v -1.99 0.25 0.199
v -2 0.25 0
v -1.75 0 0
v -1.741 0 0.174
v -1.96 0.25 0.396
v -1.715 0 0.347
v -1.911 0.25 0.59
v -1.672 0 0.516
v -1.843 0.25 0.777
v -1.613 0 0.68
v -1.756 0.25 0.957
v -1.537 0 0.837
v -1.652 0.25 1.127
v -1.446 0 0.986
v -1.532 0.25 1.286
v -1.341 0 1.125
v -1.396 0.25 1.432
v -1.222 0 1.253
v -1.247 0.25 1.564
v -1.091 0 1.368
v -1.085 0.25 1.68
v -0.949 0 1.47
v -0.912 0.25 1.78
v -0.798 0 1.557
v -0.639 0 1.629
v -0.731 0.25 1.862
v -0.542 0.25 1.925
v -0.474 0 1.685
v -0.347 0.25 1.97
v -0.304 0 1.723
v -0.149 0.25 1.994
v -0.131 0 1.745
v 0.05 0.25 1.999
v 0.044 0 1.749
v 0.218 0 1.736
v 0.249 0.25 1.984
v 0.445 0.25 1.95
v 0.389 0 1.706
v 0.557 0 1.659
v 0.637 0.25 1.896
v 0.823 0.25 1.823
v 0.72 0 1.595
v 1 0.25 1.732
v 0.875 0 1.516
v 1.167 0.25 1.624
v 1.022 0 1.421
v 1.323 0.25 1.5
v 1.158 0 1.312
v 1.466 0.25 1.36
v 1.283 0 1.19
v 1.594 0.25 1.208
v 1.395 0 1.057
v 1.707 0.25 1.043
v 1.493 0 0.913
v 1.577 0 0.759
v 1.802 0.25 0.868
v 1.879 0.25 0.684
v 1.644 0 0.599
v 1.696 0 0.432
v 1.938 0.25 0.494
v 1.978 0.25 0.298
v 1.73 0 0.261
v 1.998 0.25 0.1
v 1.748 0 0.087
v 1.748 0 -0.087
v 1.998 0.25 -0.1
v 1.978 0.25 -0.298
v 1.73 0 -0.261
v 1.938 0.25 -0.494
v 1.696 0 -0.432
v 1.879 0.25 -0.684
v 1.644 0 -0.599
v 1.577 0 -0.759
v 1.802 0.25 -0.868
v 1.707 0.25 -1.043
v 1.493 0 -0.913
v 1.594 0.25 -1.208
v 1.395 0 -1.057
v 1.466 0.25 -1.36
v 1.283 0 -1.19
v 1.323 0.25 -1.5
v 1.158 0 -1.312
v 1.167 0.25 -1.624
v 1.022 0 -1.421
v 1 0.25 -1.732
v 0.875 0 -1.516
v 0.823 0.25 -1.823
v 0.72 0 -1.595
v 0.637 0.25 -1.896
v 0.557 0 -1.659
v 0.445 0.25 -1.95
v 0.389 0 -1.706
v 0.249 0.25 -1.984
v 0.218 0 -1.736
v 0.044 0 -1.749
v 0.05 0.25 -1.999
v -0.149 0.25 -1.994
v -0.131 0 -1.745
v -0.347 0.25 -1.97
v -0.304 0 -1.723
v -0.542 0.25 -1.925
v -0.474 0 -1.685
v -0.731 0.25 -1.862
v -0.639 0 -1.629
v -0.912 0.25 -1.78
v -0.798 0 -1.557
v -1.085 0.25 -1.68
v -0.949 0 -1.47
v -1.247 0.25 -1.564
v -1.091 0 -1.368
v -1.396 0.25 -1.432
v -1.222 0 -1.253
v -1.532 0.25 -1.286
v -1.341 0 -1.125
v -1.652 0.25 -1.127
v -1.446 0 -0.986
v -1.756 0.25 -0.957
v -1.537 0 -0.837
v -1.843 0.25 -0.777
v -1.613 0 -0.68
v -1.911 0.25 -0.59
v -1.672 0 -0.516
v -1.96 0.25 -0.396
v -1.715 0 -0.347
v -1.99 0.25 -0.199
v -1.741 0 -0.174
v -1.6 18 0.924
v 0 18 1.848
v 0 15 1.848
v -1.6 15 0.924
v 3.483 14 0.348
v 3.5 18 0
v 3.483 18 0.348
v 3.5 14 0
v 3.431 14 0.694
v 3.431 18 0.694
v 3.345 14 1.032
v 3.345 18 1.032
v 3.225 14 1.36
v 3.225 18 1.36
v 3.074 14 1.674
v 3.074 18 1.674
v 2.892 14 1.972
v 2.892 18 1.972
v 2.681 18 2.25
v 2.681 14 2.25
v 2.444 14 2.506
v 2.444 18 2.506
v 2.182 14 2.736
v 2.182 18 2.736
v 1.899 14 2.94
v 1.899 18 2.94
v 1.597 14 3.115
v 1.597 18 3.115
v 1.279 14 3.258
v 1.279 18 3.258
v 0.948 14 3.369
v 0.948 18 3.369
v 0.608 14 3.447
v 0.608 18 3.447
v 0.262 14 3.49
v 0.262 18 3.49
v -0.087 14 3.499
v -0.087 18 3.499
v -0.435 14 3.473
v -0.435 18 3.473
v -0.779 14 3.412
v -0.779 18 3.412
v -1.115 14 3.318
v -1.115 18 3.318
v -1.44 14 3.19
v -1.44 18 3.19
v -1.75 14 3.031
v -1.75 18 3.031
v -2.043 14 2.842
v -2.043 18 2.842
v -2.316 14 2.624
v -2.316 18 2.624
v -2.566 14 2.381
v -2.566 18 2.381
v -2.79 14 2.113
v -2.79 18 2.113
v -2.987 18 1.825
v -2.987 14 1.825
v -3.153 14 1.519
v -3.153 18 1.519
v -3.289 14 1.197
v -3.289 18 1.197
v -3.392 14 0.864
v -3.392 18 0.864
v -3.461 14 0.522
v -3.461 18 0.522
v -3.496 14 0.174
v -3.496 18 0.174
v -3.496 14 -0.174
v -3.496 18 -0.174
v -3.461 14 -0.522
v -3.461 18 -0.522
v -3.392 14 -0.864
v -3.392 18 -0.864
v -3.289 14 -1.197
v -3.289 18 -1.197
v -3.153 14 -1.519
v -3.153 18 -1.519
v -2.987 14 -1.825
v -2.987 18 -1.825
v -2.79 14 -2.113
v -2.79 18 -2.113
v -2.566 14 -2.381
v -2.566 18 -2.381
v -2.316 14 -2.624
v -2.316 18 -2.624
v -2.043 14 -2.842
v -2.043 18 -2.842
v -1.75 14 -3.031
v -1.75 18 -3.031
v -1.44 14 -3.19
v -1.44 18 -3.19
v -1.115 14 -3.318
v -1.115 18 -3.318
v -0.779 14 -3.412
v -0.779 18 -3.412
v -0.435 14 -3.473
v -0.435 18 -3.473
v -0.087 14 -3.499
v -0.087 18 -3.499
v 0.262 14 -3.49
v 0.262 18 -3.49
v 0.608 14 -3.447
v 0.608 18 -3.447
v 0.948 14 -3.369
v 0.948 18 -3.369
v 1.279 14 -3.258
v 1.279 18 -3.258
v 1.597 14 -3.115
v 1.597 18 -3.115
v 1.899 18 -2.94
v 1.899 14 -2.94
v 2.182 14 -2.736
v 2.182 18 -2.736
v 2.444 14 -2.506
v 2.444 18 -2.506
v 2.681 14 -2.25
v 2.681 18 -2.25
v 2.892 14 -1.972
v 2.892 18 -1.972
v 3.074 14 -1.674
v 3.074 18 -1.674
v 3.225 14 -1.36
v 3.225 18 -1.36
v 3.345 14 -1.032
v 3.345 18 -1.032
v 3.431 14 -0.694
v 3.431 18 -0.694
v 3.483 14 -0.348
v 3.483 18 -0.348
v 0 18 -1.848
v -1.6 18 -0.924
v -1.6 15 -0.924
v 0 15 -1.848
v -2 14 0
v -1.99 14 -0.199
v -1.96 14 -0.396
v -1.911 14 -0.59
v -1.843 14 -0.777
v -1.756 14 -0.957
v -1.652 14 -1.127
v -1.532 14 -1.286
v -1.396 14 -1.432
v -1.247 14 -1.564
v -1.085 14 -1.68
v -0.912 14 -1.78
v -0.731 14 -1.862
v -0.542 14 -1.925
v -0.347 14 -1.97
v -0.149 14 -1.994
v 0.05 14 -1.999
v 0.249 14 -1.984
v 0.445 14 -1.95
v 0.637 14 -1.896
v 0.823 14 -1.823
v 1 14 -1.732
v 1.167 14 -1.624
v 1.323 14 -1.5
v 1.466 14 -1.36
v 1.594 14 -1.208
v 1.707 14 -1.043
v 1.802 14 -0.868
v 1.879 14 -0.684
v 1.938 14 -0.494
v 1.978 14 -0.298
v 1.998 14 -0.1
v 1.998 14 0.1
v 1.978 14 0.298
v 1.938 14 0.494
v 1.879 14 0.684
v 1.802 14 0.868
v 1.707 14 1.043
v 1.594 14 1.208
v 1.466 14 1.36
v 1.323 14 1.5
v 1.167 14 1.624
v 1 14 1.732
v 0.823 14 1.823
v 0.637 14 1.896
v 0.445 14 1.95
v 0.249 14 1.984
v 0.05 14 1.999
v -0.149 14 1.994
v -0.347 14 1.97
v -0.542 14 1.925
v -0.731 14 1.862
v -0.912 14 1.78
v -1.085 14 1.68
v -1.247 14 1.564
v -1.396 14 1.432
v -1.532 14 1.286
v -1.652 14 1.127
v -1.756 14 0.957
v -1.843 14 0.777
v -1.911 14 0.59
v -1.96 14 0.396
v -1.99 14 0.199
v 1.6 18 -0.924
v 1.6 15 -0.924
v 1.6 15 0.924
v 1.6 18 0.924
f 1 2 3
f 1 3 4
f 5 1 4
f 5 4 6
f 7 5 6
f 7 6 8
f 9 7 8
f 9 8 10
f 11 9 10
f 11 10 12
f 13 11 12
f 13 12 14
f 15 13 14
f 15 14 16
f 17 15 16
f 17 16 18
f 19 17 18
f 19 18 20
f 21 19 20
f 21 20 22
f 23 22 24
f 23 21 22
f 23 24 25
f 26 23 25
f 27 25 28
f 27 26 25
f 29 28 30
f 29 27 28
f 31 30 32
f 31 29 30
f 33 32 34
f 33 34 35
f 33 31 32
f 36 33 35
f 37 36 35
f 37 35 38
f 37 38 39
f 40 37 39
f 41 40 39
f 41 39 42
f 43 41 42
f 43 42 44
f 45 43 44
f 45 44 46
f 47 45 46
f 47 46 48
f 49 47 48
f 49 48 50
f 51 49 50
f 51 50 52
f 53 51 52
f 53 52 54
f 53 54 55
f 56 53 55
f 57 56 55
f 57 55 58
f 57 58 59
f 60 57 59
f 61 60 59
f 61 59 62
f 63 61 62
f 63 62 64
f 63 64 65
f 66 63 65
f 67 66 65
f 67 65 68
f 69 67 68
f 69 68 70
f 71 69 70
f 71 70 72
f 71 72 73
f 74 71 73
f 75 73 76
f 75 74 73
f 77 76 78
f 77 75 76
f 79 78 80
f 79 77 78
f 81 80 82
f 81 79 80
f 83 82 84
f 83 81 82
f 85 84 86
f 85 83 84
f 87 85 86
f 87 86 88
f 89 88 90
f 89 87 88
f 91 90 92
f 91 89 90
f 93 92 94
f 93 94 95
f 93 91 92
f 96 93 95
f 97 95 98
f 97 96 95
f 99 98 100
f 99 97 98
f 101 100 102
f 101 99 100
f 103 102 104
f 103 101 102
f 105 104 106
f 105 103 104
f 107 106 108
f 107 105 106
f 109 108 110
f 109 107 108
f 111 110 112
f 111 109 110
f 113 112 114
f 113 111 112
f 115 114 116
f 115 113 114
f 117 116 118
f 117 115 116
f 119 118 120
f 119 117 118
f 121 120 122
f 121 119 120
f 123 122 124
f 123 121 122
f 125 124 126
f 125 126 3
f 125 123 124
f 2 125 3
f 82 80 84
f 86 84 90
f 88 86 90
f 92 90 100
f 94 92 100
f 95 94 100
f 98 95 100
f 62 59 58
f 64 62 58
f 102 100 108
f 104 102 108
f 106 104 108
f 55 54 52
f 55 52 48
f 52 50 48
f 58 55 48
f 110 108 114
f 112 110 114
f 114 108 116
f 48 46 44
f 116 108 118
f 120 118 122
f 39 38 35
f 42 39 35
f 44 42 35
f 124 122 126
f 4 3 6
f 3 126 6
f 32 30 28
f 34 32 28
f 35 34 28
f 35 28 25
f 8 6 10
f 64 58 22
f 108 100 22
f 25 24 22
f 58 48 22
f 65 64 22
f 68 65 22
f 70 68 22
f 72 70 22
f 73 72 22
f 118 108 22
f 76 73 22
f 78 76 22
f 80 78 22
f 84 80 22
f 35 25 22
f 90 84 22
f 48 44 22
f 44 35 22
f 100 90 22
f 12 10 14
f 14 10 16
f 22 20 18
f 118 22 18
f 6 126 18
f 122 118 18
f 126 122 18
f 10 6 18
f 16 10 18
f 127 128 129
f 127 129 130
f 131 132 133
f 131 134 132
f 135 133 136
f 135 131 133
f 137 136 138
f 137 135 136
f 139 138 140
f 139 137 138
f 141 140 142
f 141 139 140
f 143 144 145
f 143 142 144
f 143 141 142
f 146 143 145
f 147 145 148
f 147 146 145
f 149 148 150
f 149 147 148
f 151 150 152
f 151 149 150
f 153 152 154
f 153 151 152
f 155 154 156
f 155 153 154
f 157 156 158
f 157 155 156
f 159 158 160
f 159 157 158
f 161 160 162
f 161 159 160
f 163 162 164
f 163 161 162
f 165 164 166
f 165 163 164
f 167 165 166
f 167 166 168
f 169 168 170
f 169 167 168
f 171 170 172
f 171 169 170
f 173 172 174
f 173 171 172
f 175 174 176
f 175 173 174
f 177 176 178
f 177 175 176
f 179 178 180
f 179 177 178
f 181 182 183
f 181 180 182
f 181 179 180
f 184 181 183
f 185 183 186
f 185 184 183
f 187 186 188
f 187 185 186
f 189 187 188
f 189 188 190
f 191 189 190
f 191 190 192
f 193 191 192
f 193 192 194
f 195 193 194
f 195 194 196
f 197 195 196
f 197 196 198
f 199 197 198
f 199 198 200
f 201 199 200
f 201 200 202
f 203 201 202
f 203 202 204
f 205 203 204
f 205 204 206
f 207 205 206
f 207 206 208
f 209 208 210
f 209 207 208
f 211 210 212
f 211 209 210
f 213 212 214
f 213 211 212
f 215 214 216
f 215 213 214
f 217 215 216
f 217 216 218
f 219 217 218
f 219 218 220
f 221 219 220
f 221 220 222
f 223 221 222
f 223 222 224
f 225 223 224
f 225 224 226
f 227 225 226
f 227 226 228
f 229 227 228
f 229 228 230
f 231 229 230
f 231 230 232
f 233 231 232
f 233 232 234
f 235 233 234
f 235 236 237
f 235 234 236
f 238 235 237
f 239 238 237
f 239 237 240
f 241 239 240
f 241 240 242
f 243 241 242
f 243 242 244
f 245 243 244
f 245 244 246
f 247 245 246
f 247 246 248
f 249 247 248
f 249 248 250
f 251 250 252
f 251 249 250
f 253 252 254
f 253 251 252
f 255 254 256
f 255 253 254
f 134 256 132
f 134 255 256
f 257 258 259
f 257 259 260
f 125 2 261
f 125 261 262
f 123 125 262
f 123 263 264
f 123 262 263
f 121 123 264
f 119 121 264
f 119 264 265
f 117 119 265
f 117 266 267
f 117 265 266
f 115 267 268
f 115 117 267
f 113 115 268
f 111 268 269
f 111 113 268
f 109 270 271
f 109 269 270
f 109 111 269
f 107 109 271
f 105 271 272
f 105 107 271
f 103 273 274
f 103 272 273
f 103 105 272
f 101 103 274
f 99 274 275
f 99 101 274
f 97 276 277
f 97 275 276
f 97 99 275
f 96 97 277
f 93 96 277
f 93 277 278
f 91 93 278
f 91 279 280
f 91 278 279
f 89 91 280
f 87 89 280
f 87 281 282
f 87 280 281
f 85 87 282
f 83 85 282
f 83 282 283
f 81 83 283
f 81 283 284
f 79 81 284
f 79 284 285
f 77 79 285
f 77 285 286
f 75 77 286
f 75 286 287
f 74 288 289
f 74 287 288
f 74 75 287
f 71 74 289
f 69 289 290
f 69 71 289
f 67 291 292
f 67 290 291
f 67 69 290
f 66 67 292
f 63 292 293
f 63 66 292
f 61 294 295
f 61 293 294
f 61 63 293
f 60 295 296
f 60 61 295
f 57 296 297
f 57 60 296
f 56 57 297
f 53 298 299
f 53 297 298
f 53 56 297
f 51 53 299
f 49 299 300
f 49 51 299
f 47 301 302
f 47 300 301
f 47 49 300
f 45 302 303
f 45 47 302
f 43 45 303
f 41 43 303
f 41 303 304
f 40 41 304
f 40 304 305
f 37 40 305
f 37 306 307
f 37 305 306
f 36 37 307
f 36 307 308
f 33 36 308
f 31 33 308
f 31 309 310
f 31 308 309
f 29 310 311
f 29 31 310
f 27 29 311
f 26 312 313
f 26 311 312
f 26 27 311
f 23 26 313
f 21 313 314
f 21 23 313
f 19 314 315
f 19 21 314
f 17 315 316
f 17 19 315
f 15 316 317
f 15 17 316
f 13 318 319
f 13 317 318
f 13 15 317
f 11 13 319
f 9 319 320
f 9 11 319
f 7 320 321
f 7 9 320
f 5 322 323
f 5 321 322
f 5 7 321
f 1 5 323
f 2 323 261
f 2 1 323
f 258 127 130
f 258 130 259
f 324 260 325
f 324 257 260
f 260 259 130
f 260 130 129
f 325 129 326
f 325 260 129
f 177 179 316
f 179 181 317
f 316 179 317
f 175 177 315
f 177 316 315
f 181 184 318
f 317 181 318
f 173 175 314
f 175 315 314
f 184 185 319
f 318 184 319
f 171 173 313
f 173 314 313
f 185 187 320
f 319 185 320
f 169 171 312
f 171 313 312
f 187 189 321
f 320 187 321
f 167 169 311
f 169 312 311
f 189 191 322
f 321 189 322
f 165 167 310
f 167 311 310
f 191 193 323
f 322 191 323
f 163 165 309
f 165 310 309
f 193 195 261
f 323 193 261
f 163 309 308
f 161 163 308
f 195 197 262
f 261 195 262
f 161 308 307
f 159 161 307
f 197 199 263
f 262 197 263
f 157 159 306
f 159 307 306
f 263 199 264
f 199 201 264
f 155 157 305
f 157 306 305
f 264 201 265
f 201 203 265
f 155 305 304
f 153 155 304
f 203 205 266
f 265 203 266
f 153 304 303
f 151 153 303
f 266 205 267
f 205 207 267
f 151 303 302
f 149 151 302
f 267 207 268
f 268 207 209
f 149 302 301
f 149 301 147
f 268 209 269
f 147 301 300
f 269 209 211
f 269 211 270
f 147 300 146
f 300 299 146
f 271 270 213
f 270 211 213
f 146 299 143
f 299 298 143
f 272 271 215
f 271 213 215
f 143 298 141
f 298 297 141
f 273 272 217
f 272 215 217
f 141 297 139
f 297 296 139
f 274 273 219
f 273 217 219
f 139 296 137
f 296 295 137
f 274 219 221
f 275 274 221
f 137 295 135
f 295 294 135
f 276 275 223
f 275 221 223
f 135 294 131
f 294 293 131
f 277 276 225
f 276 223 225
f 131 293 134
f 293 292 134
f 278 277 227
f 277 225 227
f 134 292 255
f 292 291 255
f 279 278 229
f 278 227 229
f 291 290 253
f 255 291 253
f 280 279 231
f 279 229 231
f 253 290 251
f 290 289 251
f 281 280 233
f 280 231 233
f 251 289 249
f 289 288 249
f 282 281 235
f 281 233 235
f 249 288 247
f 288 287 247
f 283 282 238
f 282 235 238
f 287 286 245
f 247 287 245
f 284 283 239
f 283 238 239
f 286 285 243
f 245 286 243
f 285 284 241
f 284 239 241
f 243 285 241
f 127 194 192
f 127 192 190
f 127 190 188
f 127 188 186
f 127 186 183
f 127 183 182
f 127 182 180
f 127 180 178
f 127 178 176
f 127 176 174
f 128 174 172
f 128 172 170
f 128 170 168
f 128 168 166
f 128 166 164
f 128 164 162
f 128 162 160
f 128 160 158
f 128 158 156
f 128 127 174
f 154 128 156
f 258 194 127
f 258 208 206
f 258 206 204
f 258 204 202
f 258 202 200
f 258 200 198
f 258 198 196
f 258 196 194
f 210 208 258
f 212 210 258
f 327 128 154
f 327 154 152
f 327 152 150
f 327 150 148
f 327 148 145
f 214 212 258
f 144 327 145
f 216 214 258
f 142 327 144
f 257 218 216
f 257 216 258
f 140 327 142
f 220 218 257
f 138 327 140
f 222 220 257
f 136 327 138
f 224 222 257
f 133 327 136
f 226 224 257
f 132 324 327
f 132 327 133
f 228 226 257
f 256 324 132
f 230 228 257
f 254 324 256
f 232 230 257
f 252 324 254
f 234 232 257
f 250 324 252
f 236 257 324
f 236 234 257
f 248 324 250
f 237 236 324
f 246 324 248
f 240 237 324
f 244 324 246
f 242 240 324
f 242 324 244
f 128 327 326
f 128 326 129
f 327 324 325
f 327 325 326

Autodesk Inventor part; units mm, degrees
ref_plane "YZ Plane" through (0, 0, 0) normal (1, 0, 0) x (0, 1, 0)
ref_plane "XZ Plane" through (0, 0, 0) normal (0, 1, 0) x (-1, 0, 0)
ref_plane "XY Plane" through (0, 0, 0) normal (0, 0, 1) x (1, 0, 0)
sketch "Sketch1" plane through (0, 0, 0) normal (0, 1, 0) x (-1, 0, 0)
  circle A0 centre (0, 0) radius 2
  dimension "d0" = 4
extrude "Extrusion1" add sketch "Sketch1" along normal blind 14
sketch "Sketch2" plane through (0, 14, 0) normal (0, 1, 0) x (1, 0, 0)
  circle A0 centre (0, 0) radius 2 projected
  circle A1 centre (0, 0) radius 3.5
  dimension "d3" = 7
extrude "Extrusion2" add sketch "Sketch2" along normal blind 4 contours A0 | A1
sketch "Sketch3" plane through (0, 18, 0) normal (0, 1, 0) x (1, 0, 0)
  circle A0 centre (0, 0) radius 3.5 projected
  line L0 (0, 1.8475) -> (1.6, 0.9238)
  line L1 (1.6, 0.9238) -> (1.6, -0.9238)
  line L2 (1.6, -0.9238) -> (0, -1.8475)
  line L3 (0, -1.8475) -> (-1.6, -0.9238)
  line L4 (-1.6, -0.9238) -> (-1.6, 0.9238)
  line L5 (-1.6, 0.9238) -> (0, 1.8475)
  dimension "d6" = 1.6
extrude "Extrusion3" cut sketch "Sketch3" against normal blind 3 contours L0 L1 L2 L3 L4 L5
thread "Thread1" size "M4x0.7" class "6g" standard "ANSI Metric M Profile" full length
chamfer "Chamfer1" distance 0.25 angle 45 1 edges at (2, 0, 0)
properties part number "SHCS4x14"
